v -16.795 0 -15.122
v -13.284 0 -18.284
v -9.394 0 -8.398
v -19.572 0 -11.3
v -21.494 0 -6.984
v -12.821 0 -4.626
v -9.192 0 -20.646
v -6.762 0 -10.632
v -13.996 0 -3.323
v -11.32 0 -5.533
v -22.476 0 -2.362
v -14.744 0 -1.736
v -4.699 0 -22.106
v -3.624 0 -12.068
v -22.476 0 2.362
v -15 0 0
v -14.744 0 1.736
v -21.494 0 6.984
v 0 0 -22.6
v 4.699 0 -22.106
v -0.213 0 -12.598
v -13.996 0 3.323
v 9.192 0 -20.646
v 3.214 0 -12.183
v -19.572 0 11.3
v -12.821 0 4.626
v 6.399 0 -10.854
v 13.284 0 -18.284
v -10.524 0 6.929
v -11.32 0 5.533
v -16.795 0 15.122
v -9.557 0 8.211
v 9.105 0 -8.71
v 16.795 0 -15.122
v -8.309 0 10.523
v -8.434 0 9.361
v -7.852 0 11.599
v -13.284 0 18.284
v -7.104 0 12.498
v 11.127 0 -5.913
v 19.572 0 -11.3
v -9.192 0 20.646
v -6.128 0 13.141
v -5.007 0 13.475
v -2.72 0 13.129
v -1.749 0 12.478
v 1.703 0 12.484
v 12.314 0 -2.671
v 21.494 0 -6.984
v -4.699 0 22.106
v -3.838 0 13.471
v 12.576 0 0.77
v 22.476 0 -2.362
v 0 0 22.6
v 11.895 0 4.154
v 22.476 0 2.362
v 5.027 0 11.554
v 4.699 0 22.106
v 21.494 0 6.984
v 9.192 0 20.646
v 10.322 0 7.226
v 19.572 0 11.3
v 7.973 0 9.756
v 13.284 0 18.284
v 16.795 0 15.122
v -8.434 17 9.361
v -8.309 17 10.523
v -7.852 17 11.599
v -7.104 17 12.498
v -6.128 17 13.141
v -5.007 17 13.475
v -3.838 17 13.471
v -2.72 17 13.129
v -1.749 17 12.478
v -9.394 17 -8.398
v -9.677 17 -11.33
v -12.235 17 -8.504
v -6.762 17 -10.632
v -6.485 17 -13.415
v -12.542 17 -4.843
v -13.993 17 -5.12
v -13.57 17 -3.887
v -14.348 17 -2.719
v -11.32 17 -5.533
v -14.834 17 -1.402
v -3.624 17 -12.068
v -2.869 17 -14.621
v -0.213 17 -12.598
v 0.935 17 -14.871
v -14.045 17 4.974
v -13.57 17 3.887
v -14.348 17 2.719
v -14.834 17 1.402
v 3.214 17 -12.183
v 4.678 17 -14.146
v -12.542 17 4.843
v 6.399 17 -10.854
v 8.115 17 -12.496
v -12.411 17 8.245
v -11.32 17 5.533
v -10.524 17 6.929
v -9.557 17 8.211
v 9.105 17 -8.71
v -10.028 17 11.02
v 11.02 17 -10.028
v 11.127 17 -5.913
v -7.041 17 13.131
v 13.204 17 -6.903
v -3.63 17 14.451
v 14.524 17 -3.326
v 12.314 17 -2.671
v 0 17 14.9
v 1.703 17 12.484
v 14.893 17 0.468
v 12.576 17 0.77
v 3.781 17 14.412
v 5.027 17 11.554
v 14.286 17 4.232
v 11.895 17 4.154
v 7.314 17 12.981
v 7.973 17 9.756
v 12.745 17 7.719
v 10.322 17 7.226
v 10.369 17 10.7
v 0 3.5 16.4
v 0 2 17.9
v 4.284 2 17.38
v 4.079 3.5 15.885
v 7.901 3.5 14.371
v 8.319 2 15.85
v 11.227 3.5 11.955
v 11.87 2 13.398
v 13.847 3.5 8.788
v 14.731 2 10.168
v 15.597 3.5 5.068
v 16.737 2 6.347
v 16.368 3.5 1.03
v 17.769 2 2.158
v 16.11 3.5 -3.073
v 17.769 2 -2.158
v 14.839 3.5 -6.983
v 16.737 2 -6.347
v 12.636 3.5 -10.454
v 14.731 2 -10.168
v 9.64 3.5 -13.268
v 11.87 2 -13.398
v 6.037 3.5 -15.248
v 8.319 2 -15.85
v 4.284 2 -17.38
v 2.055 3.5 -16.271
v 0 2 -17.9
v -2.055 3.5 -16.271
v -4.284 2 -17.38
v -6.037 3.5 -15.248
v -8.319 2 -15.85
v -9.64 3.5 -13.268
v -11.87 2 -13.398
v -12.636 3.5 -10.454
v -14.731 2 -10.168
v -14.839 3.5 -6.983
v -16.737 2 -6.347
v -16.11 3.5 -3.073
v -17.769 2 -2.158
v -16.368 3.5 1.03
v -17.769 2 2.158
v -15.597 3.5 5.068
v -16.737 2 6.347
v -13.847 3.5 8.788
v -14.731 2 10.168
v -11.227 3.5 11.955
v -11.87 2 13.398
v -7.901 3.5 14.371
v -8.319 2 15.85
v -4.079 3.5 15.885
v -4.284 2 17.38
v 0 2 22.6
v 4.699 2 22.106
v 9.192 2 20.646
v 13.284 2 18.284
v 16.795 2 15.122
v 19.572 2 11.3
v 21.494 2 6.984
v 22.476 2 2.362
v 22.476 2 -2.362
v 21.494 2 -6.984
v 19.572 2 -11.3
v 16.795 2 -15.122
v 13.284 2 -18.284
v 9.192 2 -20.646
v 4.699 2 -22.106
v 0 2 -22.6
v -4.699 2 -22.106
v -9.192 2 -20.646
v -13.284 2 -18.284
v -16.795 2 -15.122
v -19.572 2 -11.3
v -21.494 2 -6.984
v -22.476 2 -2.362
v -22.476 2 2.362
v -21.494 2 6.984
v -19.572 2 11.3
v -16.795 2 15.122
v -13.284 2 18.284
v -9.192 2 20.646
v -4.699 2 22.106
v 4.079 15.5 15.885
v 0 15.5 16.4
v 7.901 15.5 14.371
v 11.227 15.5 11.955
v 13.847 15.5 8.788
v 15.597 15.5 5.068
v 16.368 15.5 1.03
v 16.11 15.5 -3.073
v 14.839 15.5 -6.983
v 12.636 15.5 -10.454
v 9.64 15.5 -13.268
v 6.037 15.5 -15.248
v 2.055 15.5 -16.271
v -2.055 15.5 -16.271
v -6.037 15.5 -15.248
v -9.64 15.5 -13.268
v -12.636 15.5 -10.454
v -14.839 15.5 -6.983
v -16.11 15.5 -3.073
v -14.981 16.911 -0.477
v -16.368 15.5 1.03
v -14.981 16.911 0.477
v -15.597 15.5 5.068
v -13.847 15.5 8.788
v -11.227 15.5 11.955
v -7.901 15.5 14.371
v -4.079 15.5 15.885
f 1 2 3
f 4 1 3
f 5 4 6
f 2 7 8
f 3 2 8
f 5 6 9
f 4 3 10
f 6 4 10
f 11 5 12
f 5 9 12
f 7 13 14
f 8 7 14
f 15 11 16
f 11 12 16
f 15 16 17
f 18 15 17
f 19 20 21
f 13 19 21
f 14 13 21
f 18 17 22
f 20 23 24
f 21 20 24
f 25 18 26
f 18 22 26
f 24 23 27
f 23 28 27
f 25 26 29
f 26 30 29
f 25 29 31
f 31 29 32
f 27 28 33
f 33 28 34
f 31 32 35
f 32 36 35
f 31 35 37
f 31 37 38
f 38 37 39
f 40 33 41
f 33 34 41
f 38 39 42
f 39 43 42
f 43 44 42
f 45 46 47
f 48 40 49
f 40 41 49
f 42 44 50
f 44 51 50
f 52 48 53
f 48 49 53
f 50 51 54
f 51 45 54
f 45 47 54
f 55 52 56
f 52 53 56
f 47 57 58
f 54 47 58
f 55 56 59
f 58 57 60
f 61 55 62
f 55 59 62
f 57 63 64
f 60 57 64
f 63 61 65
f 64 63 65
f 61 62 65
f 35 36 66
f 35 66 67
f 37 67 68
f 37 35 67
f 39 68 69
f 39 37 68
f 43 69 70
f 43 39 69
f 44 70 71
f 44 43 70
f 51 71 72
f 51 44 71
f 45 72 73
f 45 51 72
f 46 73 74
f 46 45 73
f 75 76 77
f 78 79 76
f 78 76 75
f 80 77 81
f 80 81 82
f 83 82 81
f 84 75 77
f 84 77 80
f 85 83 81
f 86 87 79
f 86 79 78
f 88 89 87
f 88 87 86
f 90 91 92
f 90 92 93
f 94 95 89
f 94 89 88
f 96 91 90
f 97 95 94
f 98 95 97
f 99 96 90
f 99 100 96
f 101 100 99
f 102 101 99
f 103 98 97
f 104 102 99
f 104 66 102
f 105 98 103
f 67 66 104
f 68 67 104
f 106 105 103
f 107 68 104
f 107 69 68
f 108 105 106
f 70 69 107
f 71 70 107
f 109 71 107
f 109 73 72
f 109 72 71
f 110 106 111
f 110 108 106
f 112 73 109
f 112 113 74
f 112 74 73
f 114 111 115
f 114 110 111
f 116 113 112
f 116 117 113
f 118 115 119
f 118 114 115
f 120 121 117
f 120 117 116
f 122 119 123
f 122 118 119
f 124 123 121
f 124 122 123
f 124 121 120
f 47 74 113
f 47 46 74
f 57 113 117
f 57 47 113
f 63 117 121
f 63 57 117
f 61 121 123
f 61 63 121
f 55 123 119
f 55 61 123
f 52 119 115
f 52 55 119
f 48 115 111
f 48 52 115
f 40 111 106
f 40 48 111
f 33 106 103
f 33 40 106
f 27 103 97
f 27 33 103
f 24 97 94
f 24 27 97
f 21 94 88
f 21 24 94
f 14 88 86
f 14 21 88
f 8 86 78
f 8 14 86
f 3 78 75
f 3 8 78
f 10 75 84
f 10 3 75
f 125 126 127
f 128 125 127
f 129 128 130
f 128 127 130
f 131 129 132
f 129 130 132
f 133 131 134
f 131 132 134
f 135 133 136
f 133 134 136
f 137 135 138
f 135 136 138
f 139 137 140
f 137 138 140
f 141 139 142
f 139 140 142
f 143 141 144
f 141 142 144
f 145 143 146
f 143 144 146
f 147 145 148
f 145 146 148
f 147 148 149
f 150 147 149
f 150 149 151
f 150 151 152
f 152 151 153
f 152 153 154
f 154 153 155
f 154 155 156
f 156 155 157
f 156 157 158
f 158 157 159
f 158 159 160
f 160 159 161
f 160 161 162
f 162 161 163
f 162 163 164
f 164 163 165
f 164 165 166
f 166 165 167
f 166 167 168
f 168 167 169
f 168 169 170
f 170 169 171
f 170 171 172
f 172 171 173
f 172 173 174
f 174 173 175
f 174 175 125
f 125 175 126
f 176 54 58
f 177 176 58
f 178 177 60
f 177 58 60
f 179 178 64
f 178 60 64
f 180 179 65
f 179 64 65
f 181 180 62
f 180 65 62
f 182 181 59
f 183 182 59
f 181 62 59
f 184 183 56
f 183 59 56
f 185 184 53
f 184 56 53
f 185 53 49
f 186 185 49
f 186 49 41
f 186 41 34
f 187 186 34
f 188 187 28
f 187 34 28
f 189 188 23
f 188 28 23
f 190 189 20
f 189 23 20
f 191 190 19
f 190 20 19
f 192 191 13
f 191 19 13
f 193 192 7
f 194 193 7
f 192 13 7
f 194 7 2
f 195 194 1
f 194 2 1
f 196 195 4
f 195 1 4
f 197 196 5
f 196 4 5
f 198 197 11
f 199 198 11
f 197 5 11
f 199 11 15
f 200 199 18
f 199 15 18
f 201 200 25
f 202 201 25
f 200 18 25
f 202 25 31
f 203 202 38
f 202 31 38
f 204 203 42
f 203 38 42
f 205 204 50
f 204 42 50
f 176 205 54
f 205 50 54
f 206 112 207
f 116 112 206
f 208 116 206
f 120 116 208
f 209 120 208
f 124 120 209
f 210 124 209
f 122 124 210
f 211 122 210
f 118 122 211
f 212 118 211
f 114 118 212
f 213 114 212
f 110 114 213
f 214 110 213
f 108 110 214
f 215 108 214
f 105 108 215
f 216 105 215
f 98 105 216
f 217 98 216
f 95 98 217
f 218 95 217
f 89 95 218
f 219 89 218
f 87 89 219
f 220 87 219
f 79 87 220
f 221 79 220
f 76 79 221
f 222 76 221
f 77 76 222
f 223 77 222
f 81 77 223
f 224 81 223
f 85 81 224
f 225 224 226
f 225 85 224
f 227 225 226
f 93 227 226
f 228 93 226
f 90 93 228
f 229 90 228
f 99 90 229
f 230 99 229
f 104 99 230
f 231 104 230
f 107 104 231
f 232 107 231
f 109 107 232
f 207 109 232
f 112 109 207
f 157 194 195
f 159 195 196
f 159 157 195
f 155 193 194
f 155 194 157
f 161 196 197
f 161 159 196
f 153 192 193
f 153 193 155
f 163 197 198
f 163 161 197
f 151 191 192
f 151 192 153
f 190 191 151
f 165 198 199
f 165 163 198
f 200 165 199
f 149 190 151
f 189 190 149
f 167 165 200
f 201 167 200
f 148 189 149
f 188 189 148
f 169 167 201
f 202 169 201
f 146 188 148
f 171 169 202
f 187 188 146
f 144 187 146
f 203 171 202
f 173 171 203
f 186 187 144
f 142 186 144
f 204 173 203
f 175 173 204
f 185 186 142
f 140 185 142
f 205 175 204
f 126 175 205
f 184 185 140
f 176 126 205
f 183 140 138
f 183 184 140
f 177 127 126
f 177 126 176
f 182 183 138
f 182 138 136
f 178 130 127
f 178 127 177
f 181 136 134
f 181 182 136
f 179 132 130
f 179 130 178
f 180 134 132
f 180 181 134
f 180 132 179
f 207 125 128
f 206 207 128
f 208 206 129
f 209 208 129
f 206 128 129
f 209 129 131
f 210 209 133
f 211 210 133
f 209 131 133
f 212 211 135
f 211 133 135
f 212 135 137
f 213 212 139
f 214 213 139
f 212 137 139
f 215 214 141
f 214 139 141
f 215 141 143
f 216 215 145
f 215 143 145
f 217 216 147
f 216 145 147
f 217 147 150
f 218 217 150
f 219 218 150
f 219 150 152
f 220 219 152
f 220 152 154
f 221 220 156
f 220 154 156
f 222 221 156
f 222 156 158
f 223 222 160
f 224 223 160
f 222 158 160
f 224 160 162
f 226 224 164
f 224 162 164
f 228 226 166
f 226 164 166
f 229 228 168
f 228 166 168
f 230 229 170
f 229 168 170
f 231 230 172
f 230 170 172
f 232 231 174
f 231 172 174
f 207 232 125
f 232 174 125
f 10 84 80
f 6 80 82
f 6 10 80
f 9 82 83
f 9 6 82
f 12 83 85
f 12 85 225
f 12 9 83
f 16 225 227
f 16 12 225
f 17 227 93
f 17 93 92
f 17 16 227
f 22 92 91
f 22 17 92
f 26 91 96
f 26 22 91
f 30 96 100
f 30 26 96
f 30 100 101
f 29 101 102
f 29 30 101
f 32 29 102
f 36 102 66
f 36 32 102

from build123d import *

# Parameters (mm, degrees)
ESBO_O1_R                = 22.6
ESBO_O1_R_2              = 12.6
RESSALTO_EXTRUS_O1_DEPTH = 2
ESBO_O2_R                = 16.4
ESBO_O2_R_2              = 12.6
RESSALTO_EXTRUS_O2_DEPTH = 15
CHANFRO2_SIZE            = 1.5
ESBO_O3_R                = 6
ESBO_O3_R_2              = 4
CORTE_EXTRUS_O1_DEPTH    = 37.201104956


with BuildPart() as part:
    # Esboço1 → Ressalto-extrusão1 (new body)
    with BuildSketch(Plane(origin=(0, 0, 0), x_dir=(1, 0, 0), z_dir=(0, 1, 0))):
        with Locations(Location((0, 0, 0), (0, 0, 270))):
            Circle(ESBO_O1_R)
        with Locations(Location((0, 0, 0), (0, 0, 270))):
            Circle(ESBO_O1_R_2, mode=Mode.SUBTRACT)
    extrude(amount=RESSALTO_EXTRUS_O1_DEPTH)

    # Esboço2 → Ressalto-extrusão2 (add)
    with BuildSketch(Plane(origin=(0, 2, 0), x_dir=(1, 0, 0), z_dir=(0, 1, 0))):
        with Locations(Location((0, 0, 0), (0, 0, 270))):
            Circle(ESBO_O2_R)
        with Locations(Location((0, 0, 0), (0, 0, 270))):
            Circle(ESBO_O2_R_2, mode=Mode.SUBTRACT)
    extrude(amount=RESSALTO_EXTRUS_O2_DEPTH)

    # Chanfro2
    chanfro2_edges = [part.edges().sort_by_distance(p)[0] for p in [
        (0, 17, -16.4),
        (0, 2, -16.4),
    ]]
    chamfer(chanfro2_edges, length=CHANFRO2_SIZE)

    # Esboço3 → Corte-extrusão1 (cut, through all)
    with BuildSketch(Plane(origin=(0, 0, 0), x_dir=(1, 0, 0), z_dir=(0, 1, 0))):
        with Locations((-9, 0)):
            Circle(ESBO_O3_R)
        with Locations((-4.437491748, -9.516231764)):
            Circle(ESBO_O3_R_2)
    extrude(amount=CORTE_EXTRUS_O1_DEPTH, mode=Mode.SUBTRACT)


solid = part.part
